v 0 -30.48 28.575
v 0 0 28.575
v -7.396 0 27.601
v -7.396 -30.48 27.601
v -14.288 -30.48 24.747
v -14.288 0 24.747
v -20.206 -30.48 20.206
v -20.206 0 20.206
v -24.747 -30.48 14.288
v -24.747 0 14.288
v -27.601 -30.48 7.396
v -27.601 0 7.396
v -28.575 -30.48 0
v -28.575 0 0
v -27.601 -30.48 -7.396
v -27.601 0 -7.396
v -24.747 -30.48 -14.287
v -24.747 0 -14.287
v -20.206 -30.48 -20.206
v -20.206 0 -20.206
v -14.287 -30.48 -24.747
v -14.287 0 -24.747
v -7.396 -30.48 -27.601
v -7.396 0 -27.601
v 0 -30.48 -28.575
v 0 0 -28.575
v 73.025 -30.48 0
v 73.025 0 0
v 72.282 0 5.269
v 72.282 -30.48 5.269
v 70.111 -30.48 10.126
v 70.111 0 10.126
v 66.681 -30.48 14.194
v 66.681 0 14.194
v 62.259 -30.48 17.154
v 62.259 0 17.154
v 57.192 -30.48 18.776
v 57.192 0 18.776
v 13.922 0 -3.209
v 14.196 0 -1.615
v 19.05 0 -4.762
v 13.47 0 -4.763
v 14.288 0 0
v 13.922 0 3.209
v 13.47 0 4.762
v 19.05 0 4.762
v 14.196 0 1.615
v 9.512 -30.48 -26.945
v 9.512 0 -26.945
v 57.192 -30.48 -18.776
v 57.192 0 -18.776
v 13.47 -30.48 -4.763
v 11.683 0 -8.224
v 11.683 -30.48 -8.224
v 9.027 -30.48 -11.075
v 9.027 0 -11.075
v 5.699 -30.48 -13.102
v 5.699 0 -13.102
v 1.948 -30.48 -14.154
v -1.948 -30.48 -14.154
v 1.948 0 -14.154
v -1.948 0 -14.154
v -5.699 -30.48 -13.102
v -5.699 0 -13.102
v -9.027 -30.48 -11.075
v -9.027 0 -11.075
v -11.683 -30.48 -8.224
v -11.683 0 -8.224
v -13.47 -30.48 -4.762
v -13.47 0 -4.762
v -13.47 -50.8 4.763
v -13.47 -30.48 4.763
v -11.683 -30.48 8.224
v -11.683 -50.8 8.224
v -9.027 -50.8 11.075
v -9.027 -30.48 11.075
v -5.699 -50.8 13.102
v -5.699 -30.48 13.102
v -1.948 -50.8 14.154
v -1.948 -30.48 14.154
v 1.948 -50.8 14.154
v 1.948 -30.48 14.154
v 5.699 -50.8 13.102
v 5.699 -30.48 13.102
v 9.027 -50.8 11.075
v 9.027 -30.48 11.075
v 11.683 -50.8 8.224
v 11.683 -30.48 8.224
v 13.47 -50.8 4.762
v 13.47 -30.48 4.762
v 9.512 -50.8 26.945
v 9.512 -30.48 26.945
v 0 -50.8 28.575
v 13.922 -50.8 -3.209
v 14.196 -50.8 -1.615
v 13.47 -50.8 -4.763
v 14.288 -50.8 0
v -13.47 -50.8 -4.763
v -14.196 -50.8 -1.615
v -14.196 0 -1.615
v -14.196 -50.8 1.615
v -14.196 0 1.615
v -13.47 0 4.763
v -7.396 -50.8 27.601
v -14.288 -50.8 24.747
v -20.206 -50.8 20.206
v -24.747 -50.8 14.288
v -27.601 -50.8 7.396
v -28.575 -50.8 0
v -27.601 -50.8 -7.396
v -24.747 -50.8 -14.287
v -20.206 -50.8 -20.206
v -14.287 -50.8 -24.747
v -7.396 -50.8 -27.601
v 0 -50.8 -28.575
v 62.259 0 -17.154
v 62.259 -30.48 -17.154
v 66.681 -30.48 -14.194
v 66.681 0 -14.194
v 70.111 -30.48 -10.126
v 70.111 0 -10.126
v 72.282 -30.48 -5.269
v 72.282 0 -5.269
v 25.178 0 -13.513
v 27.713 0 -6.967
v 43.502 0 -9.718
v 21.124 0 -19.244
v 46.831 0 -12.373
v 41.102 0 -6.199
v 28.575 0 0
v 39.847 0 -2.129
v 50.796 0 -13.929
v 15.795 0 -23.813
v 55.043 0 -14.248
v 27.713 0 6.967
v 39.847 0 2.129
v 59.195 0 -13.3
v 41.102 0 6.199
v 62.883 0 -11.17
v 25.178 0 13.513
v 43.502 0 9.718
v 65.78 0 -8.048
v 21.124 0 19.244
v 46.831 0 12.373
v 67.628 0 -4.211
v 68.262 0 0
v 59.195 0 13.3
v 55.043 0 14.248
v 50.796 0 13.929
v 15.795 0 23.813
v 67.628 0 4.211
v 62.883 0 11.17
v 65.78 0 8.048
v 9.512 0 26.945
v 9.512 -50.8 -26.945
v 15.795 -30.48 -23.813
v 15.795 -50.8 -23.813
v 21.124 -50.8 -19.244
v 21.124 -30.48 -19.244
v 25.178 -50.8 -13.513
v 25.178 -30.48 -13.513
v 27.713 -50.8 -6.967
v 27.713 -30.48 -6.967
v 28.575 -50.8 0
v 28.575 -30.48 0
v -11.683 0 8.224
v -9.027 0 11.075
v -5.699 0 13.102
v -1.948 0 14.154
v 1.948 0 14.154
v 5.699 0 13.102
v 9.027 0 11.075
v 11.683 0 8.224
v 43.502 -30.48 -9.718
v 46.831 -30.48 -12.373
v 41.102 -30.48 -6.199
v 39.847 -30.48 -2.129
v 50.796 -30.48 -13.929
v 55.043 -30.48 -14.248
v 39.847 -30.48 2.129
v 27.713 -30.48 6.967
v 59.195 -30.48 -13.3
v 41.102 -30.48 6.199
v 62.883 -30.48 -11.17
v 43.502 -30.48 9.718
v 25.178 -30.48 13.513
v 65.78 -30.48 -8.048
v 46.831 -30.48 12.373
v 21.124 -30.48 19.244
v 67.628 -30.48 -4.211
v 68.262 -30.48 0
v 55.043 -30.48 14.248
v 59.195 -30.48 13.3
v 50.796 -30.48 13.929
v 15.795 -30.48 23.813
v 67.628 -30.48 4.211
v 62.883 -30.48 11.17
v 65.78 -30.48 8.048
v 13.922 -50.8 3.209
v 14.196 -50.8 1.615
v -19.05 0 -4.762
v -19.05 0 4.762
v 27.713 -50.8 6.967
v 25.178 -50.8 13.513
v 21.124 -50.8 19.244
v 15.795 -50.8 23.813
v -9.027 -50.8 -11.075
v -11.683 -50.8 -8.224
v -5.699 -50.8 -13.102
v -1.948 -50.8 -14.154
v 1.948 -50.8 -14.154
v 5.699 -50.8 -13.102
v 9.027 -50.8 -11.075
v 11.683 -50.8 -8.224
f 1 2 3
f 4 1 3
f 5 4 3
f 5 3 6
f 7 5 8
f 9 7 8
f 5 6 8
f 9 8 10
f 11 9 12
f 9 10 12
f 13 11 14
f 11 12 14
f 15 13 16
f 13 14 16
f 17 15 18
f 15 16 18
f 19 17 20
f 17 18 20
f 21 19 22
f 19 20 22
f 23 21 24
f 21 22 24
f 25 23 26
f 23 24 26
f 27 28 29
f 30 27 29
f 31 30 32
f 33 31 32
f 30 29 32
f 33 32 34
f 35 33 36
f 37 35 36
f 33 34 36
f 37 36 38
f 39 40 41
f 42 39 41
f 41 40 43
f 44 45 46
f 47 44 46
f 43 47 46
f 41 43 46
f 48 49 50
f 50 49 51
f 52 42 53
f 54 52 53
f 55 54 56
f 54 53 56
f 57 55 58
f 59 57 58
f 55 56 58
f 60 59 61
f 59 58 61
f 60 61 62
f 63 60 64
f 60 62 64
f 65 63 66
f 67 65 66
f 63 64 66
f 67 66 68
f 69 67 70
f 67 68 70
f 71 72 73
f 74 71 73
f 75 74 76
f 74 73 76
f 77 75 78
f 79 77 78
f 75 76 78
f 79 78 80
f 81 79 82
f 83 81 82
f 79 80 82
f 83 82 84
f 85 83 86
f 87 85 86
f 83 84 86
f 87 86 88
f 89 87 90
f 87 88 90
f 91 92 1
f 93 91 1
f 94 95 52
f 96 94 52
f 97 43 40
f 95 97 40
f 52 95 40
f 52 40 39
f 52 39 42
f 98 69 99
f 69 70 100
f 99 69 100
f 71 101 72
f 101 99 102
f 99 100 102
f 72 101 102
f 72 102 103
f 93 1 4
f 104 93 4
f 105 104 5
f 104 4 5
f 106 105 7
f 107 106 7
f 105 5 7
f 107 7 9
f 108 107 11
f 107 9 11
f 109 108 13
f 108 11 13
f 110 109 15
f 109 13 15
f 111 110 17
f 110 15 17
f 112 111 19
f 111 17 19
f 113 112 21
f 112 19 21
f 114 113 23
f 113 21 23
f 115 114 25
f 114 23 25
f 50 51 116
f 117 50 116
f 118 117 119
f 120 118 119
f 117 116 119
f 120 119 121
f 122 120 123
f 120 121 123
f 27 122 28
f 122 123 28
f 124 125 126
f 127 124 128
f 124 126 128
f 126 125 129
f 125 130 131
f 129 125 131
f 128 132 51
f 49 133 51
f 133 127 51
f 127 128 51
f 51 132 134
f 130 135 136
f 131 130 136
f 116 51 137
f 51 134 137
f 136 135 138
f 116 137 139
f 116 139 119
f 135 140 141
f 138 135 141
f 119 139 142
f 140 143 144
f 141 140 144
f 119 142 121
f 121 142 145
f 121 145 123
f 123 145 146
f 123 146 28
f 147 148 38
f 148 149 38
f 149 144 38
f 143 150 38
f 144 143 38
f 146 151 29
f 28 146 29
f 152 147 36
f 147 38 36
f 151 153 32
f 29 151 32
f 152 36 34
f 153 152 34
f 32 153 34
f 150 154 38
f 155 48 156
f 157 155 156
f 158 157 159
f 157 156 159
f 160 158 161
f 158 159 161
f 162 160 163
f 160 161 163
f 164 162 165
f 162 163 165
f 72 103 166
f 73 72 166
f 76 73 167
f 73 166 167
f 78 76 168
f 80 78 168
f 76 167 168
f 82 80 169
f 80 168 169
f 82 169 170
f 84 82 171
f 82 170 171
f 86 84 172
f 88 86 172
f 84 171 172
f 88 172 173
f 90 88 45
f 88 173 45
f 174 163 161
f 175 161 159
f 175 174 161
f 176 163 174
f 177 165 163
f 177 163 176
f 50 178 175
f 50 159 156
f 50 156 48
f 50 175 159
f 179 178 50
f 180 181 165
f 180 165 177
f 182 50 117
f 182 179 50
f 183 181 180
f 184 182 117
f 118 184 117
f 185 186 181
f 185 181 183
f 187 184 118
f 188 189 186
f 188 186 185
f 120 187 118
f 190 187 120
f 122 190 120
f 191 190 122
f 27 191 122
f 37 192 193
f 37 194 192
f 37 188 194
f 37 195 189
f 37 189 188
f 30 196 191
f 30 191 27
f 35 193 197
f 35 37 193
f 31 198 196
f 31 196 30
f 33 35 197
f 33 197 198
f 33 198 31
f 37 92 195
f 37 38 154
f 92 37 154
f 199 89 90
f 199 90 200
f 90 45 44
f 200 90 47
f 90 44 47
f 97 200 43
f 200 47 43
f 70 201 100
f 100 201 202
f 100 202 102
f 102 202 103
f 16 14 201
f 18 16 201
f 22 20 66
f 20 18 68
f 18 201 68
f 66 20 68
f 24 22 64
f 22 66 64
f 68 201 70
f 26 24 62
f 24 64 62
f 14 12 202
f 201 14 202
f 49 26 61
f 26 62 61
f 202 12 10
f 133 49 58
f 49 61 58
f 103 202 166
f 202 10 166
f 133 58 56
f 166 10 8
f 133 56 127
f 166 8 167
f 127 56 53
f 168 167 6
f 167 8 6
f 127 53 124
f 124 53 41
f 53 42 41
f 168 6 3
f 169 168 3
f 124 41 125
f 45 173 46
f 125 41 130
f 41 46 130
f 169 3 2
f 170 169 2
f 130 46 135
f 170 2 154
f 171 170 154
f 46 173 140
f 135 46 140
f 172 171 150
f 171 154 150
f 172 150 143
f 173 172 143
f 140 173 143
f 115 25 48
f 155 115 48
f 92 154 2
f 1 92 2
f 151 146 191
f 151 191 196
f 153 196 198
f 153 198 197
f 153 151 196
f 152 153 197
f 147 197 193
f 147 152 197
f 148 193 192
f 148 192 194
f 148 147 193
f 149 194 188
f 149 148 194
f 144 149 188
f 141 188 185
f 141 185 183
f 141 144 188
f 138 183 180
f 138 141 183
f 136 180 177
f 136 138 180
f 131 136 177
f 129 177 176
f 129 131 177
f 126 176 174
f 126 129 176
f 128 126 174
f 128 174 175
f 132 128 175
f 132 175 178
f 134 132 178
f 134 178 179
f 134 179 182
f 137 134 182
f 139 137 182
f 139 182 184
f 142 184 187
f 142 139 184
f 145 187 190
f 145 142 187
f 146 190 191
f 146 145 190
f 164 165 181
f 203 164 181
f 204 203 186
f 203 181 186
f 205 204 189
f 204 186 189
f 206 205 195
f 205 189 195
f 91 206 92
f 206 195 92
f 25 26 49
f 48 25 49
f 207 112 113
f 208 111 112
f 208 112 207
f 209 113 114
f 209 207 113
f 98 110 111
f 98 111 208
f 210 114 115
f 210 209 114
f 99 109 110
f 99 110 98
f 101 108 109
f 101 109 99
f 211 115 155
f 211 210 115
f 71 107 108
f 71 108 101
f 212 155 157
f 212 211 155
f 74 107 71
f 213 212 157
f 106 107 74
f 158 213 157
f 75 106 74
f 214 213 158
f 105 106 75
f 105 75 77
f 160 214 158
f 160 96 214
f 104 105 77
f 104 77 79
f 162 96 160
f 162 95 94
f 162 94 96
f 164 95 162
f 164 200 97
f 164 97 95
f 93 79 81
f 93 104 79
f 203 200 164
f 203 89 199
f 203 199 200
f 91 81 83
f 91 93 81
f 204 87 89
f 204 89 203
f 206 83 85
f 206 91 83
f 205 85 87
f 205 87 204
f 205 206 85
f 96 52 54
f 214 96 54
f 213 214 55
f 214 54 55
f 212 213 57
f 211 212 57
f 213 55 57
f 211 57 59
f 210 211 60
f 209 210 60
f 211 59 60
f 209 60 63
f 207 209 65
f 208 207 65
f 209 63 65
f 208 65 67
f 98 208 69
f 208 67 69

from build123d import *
from build123d import SkipClean  # not in build123d's __all__

# Parameters (mm, degrees)
F0_R     = 14.2875
F1_DEPTH = 30.48
F2_DEPTH = 50.8


with BuildPart() as f1:
    # F0 (on Front) → F1 (new body)
    with BuildSketch(Plane.XZ):
        with BuildLine():
            Line((9.5121844836, 26.9452959039), (0, 28.575))
            ThreePointArc((0, 28.575), (-28.575, 0), (0, -28.575))
            Line((0, -28.575), (9.5121844836, -26.9452959039))
            ThreePointArc((9.5121844836, -26.9452959039), (23.3274655355, -16.5033322905), (28.575, 0))
            ThreePointArc((28.575, 0), (23.3274655355, 16.5033322905), (9.5121844836, 26.9452959039))
        make_face()
        with BuildLine():
            ThreePointArc((-13.4703841816, 4.7625), (0, 14.2875), (13.4703841816, 4.7625))
            Line((13.4703841816, 4.7625), (19.05, 4.7625))
            Line((19.05, 4.7625), (19.05, -4.7625))
            Line((19.05, -4.7625), (13.4703841816, -4.7625))
            ThreePointArc((13.4703841816, -4.7625), (0, -14.2875), (-13.4703841816, -4.7625))
            Line((-13.4703841816, -4.7625), (-19.05, -4.7625))
            Line((-19.05, -4.7625), (-19.05, 4.7625))
            Line((-19.05, 4.7625), (-13.4703841816, 4.7625))
        make_face(mode=Mode.SUBTRACT)
        with BuildLine():
            Line((57.1919272622, 18.7764181619), (9.5121844836, 26.9452959039))
            ThreePointArc((9.5121844836, 26.9452959039), (23.3274655355, 16.5033322905), (28.575, 0))
            ThreePointArc((28.575, 0), (23.3274655355, -16.5033322905), (9.5121844836, -26.9452959039))
            Line((9.5121844836, -26.9452959039), (57.1919272622, -18.7764181619))
            ThreePointArc((57.1919272622, -18.7764181619), (34.925, 0), (57.1919272622, 18.7764181619))
        make_face()
        with BuildLine():
            ThreePointArc((73.025, 0), (68.5383952831, 12.2804730295), (57.1919272622, 18.7764181619))
            ThreePointArc((57.1919272622, 18.7764181619), (34.925, 0), (57.1919272622, -18.7764181619))
            ThreePointArc((57.1919272622, -18.7764181619), (68.5383952831, -12.2804730295), (73.025, 0))
        make_face()
        with Locations((53.975, 0)):
            Circle(F0_R, mode=Mode.SUBTRACT)
    extrude(amount=F1_DEPTH)

    # F0 (on Front) → F2 (join)
    with BuildSketch(Plane.XZ):
        with BuildLine():
            Line((9.5121844836, 26.9452959039), (0, 28.575))
            ThreePointArc((0, 28.575), (-28.575, 0), (0, -28.575))
            Line((0, -28.575), (9.5121844836, -26.9452959039))
            ThreePointArc((9.5121844836, -26.9452959039), (23.3274655355, -16.5033322905), (28.575, 0))
            ThreePointArc((28.575, 0), (23.3274655355, 16.5033322905), (9.5121844836, 26.9452959039))
        make_face()
        with BuildLine():
            ThreePointArc((-13.4703841816, 4.7625), (0, 14.2875), (13.4703841816, 4.7625))
            Line((13.4703841816, 4.7625), (19.05, 4.7625))
            Line((19.05, 4.7625), (19.05, -4.7625))
            Line((19.05, -4.7625), (13.4703841816, -4.7625))
            ThreePointArc((13.4703841816, -4.7625), (0, -14.2875), (-13.4703841816, -4.7625))
            Line((-13.4703841816, -4.7625), (-19.05, -4.7625))
            Line((-19.05, -4.7625), (-19.05, 4.7625))
            Line((-19.05, 4.7625), (-13.4703841816, 4.7625))
        make_face(mode=Mode.SUBTRACT)
        with BuildLine():
            ThreePointArc((-13.4703841816, -4.7625), (-14.2875, 0), (-13.4703841816, 4.7625))
            Line((-13.4703841816, 4.7625), (-19.05, 4.7625))
            Line((-19.05, 4.7625), (-19.05, -4.7625))
            Line((-19.05, -4.7625), (-13.4703841816, -4.7625))
        make_face()
        with BuildLine():
            ThreePointArc((13.4703841816, 4.7625), (14.081739421, 2.416044521), (14.2875, 0))
            ThreePointArc((14.2875, 0), (14.081739421, -2.416044521), (13.4703841816, -4.7625))
            Line((13.4703841816, -4.7625), (19.05, -4.7625))
            Line((19.05, -4.7625), (19.05, 4.7625))
            Line((19.05, 4.7625), (13.4703841816, 4.7625))
        make_face()
    with SkipClean():  # cleaning this boolean's faces spoils the solid; the shape is the same uncleaned
        extrude(amount=F2_DEPTH)


solid = f1.part
